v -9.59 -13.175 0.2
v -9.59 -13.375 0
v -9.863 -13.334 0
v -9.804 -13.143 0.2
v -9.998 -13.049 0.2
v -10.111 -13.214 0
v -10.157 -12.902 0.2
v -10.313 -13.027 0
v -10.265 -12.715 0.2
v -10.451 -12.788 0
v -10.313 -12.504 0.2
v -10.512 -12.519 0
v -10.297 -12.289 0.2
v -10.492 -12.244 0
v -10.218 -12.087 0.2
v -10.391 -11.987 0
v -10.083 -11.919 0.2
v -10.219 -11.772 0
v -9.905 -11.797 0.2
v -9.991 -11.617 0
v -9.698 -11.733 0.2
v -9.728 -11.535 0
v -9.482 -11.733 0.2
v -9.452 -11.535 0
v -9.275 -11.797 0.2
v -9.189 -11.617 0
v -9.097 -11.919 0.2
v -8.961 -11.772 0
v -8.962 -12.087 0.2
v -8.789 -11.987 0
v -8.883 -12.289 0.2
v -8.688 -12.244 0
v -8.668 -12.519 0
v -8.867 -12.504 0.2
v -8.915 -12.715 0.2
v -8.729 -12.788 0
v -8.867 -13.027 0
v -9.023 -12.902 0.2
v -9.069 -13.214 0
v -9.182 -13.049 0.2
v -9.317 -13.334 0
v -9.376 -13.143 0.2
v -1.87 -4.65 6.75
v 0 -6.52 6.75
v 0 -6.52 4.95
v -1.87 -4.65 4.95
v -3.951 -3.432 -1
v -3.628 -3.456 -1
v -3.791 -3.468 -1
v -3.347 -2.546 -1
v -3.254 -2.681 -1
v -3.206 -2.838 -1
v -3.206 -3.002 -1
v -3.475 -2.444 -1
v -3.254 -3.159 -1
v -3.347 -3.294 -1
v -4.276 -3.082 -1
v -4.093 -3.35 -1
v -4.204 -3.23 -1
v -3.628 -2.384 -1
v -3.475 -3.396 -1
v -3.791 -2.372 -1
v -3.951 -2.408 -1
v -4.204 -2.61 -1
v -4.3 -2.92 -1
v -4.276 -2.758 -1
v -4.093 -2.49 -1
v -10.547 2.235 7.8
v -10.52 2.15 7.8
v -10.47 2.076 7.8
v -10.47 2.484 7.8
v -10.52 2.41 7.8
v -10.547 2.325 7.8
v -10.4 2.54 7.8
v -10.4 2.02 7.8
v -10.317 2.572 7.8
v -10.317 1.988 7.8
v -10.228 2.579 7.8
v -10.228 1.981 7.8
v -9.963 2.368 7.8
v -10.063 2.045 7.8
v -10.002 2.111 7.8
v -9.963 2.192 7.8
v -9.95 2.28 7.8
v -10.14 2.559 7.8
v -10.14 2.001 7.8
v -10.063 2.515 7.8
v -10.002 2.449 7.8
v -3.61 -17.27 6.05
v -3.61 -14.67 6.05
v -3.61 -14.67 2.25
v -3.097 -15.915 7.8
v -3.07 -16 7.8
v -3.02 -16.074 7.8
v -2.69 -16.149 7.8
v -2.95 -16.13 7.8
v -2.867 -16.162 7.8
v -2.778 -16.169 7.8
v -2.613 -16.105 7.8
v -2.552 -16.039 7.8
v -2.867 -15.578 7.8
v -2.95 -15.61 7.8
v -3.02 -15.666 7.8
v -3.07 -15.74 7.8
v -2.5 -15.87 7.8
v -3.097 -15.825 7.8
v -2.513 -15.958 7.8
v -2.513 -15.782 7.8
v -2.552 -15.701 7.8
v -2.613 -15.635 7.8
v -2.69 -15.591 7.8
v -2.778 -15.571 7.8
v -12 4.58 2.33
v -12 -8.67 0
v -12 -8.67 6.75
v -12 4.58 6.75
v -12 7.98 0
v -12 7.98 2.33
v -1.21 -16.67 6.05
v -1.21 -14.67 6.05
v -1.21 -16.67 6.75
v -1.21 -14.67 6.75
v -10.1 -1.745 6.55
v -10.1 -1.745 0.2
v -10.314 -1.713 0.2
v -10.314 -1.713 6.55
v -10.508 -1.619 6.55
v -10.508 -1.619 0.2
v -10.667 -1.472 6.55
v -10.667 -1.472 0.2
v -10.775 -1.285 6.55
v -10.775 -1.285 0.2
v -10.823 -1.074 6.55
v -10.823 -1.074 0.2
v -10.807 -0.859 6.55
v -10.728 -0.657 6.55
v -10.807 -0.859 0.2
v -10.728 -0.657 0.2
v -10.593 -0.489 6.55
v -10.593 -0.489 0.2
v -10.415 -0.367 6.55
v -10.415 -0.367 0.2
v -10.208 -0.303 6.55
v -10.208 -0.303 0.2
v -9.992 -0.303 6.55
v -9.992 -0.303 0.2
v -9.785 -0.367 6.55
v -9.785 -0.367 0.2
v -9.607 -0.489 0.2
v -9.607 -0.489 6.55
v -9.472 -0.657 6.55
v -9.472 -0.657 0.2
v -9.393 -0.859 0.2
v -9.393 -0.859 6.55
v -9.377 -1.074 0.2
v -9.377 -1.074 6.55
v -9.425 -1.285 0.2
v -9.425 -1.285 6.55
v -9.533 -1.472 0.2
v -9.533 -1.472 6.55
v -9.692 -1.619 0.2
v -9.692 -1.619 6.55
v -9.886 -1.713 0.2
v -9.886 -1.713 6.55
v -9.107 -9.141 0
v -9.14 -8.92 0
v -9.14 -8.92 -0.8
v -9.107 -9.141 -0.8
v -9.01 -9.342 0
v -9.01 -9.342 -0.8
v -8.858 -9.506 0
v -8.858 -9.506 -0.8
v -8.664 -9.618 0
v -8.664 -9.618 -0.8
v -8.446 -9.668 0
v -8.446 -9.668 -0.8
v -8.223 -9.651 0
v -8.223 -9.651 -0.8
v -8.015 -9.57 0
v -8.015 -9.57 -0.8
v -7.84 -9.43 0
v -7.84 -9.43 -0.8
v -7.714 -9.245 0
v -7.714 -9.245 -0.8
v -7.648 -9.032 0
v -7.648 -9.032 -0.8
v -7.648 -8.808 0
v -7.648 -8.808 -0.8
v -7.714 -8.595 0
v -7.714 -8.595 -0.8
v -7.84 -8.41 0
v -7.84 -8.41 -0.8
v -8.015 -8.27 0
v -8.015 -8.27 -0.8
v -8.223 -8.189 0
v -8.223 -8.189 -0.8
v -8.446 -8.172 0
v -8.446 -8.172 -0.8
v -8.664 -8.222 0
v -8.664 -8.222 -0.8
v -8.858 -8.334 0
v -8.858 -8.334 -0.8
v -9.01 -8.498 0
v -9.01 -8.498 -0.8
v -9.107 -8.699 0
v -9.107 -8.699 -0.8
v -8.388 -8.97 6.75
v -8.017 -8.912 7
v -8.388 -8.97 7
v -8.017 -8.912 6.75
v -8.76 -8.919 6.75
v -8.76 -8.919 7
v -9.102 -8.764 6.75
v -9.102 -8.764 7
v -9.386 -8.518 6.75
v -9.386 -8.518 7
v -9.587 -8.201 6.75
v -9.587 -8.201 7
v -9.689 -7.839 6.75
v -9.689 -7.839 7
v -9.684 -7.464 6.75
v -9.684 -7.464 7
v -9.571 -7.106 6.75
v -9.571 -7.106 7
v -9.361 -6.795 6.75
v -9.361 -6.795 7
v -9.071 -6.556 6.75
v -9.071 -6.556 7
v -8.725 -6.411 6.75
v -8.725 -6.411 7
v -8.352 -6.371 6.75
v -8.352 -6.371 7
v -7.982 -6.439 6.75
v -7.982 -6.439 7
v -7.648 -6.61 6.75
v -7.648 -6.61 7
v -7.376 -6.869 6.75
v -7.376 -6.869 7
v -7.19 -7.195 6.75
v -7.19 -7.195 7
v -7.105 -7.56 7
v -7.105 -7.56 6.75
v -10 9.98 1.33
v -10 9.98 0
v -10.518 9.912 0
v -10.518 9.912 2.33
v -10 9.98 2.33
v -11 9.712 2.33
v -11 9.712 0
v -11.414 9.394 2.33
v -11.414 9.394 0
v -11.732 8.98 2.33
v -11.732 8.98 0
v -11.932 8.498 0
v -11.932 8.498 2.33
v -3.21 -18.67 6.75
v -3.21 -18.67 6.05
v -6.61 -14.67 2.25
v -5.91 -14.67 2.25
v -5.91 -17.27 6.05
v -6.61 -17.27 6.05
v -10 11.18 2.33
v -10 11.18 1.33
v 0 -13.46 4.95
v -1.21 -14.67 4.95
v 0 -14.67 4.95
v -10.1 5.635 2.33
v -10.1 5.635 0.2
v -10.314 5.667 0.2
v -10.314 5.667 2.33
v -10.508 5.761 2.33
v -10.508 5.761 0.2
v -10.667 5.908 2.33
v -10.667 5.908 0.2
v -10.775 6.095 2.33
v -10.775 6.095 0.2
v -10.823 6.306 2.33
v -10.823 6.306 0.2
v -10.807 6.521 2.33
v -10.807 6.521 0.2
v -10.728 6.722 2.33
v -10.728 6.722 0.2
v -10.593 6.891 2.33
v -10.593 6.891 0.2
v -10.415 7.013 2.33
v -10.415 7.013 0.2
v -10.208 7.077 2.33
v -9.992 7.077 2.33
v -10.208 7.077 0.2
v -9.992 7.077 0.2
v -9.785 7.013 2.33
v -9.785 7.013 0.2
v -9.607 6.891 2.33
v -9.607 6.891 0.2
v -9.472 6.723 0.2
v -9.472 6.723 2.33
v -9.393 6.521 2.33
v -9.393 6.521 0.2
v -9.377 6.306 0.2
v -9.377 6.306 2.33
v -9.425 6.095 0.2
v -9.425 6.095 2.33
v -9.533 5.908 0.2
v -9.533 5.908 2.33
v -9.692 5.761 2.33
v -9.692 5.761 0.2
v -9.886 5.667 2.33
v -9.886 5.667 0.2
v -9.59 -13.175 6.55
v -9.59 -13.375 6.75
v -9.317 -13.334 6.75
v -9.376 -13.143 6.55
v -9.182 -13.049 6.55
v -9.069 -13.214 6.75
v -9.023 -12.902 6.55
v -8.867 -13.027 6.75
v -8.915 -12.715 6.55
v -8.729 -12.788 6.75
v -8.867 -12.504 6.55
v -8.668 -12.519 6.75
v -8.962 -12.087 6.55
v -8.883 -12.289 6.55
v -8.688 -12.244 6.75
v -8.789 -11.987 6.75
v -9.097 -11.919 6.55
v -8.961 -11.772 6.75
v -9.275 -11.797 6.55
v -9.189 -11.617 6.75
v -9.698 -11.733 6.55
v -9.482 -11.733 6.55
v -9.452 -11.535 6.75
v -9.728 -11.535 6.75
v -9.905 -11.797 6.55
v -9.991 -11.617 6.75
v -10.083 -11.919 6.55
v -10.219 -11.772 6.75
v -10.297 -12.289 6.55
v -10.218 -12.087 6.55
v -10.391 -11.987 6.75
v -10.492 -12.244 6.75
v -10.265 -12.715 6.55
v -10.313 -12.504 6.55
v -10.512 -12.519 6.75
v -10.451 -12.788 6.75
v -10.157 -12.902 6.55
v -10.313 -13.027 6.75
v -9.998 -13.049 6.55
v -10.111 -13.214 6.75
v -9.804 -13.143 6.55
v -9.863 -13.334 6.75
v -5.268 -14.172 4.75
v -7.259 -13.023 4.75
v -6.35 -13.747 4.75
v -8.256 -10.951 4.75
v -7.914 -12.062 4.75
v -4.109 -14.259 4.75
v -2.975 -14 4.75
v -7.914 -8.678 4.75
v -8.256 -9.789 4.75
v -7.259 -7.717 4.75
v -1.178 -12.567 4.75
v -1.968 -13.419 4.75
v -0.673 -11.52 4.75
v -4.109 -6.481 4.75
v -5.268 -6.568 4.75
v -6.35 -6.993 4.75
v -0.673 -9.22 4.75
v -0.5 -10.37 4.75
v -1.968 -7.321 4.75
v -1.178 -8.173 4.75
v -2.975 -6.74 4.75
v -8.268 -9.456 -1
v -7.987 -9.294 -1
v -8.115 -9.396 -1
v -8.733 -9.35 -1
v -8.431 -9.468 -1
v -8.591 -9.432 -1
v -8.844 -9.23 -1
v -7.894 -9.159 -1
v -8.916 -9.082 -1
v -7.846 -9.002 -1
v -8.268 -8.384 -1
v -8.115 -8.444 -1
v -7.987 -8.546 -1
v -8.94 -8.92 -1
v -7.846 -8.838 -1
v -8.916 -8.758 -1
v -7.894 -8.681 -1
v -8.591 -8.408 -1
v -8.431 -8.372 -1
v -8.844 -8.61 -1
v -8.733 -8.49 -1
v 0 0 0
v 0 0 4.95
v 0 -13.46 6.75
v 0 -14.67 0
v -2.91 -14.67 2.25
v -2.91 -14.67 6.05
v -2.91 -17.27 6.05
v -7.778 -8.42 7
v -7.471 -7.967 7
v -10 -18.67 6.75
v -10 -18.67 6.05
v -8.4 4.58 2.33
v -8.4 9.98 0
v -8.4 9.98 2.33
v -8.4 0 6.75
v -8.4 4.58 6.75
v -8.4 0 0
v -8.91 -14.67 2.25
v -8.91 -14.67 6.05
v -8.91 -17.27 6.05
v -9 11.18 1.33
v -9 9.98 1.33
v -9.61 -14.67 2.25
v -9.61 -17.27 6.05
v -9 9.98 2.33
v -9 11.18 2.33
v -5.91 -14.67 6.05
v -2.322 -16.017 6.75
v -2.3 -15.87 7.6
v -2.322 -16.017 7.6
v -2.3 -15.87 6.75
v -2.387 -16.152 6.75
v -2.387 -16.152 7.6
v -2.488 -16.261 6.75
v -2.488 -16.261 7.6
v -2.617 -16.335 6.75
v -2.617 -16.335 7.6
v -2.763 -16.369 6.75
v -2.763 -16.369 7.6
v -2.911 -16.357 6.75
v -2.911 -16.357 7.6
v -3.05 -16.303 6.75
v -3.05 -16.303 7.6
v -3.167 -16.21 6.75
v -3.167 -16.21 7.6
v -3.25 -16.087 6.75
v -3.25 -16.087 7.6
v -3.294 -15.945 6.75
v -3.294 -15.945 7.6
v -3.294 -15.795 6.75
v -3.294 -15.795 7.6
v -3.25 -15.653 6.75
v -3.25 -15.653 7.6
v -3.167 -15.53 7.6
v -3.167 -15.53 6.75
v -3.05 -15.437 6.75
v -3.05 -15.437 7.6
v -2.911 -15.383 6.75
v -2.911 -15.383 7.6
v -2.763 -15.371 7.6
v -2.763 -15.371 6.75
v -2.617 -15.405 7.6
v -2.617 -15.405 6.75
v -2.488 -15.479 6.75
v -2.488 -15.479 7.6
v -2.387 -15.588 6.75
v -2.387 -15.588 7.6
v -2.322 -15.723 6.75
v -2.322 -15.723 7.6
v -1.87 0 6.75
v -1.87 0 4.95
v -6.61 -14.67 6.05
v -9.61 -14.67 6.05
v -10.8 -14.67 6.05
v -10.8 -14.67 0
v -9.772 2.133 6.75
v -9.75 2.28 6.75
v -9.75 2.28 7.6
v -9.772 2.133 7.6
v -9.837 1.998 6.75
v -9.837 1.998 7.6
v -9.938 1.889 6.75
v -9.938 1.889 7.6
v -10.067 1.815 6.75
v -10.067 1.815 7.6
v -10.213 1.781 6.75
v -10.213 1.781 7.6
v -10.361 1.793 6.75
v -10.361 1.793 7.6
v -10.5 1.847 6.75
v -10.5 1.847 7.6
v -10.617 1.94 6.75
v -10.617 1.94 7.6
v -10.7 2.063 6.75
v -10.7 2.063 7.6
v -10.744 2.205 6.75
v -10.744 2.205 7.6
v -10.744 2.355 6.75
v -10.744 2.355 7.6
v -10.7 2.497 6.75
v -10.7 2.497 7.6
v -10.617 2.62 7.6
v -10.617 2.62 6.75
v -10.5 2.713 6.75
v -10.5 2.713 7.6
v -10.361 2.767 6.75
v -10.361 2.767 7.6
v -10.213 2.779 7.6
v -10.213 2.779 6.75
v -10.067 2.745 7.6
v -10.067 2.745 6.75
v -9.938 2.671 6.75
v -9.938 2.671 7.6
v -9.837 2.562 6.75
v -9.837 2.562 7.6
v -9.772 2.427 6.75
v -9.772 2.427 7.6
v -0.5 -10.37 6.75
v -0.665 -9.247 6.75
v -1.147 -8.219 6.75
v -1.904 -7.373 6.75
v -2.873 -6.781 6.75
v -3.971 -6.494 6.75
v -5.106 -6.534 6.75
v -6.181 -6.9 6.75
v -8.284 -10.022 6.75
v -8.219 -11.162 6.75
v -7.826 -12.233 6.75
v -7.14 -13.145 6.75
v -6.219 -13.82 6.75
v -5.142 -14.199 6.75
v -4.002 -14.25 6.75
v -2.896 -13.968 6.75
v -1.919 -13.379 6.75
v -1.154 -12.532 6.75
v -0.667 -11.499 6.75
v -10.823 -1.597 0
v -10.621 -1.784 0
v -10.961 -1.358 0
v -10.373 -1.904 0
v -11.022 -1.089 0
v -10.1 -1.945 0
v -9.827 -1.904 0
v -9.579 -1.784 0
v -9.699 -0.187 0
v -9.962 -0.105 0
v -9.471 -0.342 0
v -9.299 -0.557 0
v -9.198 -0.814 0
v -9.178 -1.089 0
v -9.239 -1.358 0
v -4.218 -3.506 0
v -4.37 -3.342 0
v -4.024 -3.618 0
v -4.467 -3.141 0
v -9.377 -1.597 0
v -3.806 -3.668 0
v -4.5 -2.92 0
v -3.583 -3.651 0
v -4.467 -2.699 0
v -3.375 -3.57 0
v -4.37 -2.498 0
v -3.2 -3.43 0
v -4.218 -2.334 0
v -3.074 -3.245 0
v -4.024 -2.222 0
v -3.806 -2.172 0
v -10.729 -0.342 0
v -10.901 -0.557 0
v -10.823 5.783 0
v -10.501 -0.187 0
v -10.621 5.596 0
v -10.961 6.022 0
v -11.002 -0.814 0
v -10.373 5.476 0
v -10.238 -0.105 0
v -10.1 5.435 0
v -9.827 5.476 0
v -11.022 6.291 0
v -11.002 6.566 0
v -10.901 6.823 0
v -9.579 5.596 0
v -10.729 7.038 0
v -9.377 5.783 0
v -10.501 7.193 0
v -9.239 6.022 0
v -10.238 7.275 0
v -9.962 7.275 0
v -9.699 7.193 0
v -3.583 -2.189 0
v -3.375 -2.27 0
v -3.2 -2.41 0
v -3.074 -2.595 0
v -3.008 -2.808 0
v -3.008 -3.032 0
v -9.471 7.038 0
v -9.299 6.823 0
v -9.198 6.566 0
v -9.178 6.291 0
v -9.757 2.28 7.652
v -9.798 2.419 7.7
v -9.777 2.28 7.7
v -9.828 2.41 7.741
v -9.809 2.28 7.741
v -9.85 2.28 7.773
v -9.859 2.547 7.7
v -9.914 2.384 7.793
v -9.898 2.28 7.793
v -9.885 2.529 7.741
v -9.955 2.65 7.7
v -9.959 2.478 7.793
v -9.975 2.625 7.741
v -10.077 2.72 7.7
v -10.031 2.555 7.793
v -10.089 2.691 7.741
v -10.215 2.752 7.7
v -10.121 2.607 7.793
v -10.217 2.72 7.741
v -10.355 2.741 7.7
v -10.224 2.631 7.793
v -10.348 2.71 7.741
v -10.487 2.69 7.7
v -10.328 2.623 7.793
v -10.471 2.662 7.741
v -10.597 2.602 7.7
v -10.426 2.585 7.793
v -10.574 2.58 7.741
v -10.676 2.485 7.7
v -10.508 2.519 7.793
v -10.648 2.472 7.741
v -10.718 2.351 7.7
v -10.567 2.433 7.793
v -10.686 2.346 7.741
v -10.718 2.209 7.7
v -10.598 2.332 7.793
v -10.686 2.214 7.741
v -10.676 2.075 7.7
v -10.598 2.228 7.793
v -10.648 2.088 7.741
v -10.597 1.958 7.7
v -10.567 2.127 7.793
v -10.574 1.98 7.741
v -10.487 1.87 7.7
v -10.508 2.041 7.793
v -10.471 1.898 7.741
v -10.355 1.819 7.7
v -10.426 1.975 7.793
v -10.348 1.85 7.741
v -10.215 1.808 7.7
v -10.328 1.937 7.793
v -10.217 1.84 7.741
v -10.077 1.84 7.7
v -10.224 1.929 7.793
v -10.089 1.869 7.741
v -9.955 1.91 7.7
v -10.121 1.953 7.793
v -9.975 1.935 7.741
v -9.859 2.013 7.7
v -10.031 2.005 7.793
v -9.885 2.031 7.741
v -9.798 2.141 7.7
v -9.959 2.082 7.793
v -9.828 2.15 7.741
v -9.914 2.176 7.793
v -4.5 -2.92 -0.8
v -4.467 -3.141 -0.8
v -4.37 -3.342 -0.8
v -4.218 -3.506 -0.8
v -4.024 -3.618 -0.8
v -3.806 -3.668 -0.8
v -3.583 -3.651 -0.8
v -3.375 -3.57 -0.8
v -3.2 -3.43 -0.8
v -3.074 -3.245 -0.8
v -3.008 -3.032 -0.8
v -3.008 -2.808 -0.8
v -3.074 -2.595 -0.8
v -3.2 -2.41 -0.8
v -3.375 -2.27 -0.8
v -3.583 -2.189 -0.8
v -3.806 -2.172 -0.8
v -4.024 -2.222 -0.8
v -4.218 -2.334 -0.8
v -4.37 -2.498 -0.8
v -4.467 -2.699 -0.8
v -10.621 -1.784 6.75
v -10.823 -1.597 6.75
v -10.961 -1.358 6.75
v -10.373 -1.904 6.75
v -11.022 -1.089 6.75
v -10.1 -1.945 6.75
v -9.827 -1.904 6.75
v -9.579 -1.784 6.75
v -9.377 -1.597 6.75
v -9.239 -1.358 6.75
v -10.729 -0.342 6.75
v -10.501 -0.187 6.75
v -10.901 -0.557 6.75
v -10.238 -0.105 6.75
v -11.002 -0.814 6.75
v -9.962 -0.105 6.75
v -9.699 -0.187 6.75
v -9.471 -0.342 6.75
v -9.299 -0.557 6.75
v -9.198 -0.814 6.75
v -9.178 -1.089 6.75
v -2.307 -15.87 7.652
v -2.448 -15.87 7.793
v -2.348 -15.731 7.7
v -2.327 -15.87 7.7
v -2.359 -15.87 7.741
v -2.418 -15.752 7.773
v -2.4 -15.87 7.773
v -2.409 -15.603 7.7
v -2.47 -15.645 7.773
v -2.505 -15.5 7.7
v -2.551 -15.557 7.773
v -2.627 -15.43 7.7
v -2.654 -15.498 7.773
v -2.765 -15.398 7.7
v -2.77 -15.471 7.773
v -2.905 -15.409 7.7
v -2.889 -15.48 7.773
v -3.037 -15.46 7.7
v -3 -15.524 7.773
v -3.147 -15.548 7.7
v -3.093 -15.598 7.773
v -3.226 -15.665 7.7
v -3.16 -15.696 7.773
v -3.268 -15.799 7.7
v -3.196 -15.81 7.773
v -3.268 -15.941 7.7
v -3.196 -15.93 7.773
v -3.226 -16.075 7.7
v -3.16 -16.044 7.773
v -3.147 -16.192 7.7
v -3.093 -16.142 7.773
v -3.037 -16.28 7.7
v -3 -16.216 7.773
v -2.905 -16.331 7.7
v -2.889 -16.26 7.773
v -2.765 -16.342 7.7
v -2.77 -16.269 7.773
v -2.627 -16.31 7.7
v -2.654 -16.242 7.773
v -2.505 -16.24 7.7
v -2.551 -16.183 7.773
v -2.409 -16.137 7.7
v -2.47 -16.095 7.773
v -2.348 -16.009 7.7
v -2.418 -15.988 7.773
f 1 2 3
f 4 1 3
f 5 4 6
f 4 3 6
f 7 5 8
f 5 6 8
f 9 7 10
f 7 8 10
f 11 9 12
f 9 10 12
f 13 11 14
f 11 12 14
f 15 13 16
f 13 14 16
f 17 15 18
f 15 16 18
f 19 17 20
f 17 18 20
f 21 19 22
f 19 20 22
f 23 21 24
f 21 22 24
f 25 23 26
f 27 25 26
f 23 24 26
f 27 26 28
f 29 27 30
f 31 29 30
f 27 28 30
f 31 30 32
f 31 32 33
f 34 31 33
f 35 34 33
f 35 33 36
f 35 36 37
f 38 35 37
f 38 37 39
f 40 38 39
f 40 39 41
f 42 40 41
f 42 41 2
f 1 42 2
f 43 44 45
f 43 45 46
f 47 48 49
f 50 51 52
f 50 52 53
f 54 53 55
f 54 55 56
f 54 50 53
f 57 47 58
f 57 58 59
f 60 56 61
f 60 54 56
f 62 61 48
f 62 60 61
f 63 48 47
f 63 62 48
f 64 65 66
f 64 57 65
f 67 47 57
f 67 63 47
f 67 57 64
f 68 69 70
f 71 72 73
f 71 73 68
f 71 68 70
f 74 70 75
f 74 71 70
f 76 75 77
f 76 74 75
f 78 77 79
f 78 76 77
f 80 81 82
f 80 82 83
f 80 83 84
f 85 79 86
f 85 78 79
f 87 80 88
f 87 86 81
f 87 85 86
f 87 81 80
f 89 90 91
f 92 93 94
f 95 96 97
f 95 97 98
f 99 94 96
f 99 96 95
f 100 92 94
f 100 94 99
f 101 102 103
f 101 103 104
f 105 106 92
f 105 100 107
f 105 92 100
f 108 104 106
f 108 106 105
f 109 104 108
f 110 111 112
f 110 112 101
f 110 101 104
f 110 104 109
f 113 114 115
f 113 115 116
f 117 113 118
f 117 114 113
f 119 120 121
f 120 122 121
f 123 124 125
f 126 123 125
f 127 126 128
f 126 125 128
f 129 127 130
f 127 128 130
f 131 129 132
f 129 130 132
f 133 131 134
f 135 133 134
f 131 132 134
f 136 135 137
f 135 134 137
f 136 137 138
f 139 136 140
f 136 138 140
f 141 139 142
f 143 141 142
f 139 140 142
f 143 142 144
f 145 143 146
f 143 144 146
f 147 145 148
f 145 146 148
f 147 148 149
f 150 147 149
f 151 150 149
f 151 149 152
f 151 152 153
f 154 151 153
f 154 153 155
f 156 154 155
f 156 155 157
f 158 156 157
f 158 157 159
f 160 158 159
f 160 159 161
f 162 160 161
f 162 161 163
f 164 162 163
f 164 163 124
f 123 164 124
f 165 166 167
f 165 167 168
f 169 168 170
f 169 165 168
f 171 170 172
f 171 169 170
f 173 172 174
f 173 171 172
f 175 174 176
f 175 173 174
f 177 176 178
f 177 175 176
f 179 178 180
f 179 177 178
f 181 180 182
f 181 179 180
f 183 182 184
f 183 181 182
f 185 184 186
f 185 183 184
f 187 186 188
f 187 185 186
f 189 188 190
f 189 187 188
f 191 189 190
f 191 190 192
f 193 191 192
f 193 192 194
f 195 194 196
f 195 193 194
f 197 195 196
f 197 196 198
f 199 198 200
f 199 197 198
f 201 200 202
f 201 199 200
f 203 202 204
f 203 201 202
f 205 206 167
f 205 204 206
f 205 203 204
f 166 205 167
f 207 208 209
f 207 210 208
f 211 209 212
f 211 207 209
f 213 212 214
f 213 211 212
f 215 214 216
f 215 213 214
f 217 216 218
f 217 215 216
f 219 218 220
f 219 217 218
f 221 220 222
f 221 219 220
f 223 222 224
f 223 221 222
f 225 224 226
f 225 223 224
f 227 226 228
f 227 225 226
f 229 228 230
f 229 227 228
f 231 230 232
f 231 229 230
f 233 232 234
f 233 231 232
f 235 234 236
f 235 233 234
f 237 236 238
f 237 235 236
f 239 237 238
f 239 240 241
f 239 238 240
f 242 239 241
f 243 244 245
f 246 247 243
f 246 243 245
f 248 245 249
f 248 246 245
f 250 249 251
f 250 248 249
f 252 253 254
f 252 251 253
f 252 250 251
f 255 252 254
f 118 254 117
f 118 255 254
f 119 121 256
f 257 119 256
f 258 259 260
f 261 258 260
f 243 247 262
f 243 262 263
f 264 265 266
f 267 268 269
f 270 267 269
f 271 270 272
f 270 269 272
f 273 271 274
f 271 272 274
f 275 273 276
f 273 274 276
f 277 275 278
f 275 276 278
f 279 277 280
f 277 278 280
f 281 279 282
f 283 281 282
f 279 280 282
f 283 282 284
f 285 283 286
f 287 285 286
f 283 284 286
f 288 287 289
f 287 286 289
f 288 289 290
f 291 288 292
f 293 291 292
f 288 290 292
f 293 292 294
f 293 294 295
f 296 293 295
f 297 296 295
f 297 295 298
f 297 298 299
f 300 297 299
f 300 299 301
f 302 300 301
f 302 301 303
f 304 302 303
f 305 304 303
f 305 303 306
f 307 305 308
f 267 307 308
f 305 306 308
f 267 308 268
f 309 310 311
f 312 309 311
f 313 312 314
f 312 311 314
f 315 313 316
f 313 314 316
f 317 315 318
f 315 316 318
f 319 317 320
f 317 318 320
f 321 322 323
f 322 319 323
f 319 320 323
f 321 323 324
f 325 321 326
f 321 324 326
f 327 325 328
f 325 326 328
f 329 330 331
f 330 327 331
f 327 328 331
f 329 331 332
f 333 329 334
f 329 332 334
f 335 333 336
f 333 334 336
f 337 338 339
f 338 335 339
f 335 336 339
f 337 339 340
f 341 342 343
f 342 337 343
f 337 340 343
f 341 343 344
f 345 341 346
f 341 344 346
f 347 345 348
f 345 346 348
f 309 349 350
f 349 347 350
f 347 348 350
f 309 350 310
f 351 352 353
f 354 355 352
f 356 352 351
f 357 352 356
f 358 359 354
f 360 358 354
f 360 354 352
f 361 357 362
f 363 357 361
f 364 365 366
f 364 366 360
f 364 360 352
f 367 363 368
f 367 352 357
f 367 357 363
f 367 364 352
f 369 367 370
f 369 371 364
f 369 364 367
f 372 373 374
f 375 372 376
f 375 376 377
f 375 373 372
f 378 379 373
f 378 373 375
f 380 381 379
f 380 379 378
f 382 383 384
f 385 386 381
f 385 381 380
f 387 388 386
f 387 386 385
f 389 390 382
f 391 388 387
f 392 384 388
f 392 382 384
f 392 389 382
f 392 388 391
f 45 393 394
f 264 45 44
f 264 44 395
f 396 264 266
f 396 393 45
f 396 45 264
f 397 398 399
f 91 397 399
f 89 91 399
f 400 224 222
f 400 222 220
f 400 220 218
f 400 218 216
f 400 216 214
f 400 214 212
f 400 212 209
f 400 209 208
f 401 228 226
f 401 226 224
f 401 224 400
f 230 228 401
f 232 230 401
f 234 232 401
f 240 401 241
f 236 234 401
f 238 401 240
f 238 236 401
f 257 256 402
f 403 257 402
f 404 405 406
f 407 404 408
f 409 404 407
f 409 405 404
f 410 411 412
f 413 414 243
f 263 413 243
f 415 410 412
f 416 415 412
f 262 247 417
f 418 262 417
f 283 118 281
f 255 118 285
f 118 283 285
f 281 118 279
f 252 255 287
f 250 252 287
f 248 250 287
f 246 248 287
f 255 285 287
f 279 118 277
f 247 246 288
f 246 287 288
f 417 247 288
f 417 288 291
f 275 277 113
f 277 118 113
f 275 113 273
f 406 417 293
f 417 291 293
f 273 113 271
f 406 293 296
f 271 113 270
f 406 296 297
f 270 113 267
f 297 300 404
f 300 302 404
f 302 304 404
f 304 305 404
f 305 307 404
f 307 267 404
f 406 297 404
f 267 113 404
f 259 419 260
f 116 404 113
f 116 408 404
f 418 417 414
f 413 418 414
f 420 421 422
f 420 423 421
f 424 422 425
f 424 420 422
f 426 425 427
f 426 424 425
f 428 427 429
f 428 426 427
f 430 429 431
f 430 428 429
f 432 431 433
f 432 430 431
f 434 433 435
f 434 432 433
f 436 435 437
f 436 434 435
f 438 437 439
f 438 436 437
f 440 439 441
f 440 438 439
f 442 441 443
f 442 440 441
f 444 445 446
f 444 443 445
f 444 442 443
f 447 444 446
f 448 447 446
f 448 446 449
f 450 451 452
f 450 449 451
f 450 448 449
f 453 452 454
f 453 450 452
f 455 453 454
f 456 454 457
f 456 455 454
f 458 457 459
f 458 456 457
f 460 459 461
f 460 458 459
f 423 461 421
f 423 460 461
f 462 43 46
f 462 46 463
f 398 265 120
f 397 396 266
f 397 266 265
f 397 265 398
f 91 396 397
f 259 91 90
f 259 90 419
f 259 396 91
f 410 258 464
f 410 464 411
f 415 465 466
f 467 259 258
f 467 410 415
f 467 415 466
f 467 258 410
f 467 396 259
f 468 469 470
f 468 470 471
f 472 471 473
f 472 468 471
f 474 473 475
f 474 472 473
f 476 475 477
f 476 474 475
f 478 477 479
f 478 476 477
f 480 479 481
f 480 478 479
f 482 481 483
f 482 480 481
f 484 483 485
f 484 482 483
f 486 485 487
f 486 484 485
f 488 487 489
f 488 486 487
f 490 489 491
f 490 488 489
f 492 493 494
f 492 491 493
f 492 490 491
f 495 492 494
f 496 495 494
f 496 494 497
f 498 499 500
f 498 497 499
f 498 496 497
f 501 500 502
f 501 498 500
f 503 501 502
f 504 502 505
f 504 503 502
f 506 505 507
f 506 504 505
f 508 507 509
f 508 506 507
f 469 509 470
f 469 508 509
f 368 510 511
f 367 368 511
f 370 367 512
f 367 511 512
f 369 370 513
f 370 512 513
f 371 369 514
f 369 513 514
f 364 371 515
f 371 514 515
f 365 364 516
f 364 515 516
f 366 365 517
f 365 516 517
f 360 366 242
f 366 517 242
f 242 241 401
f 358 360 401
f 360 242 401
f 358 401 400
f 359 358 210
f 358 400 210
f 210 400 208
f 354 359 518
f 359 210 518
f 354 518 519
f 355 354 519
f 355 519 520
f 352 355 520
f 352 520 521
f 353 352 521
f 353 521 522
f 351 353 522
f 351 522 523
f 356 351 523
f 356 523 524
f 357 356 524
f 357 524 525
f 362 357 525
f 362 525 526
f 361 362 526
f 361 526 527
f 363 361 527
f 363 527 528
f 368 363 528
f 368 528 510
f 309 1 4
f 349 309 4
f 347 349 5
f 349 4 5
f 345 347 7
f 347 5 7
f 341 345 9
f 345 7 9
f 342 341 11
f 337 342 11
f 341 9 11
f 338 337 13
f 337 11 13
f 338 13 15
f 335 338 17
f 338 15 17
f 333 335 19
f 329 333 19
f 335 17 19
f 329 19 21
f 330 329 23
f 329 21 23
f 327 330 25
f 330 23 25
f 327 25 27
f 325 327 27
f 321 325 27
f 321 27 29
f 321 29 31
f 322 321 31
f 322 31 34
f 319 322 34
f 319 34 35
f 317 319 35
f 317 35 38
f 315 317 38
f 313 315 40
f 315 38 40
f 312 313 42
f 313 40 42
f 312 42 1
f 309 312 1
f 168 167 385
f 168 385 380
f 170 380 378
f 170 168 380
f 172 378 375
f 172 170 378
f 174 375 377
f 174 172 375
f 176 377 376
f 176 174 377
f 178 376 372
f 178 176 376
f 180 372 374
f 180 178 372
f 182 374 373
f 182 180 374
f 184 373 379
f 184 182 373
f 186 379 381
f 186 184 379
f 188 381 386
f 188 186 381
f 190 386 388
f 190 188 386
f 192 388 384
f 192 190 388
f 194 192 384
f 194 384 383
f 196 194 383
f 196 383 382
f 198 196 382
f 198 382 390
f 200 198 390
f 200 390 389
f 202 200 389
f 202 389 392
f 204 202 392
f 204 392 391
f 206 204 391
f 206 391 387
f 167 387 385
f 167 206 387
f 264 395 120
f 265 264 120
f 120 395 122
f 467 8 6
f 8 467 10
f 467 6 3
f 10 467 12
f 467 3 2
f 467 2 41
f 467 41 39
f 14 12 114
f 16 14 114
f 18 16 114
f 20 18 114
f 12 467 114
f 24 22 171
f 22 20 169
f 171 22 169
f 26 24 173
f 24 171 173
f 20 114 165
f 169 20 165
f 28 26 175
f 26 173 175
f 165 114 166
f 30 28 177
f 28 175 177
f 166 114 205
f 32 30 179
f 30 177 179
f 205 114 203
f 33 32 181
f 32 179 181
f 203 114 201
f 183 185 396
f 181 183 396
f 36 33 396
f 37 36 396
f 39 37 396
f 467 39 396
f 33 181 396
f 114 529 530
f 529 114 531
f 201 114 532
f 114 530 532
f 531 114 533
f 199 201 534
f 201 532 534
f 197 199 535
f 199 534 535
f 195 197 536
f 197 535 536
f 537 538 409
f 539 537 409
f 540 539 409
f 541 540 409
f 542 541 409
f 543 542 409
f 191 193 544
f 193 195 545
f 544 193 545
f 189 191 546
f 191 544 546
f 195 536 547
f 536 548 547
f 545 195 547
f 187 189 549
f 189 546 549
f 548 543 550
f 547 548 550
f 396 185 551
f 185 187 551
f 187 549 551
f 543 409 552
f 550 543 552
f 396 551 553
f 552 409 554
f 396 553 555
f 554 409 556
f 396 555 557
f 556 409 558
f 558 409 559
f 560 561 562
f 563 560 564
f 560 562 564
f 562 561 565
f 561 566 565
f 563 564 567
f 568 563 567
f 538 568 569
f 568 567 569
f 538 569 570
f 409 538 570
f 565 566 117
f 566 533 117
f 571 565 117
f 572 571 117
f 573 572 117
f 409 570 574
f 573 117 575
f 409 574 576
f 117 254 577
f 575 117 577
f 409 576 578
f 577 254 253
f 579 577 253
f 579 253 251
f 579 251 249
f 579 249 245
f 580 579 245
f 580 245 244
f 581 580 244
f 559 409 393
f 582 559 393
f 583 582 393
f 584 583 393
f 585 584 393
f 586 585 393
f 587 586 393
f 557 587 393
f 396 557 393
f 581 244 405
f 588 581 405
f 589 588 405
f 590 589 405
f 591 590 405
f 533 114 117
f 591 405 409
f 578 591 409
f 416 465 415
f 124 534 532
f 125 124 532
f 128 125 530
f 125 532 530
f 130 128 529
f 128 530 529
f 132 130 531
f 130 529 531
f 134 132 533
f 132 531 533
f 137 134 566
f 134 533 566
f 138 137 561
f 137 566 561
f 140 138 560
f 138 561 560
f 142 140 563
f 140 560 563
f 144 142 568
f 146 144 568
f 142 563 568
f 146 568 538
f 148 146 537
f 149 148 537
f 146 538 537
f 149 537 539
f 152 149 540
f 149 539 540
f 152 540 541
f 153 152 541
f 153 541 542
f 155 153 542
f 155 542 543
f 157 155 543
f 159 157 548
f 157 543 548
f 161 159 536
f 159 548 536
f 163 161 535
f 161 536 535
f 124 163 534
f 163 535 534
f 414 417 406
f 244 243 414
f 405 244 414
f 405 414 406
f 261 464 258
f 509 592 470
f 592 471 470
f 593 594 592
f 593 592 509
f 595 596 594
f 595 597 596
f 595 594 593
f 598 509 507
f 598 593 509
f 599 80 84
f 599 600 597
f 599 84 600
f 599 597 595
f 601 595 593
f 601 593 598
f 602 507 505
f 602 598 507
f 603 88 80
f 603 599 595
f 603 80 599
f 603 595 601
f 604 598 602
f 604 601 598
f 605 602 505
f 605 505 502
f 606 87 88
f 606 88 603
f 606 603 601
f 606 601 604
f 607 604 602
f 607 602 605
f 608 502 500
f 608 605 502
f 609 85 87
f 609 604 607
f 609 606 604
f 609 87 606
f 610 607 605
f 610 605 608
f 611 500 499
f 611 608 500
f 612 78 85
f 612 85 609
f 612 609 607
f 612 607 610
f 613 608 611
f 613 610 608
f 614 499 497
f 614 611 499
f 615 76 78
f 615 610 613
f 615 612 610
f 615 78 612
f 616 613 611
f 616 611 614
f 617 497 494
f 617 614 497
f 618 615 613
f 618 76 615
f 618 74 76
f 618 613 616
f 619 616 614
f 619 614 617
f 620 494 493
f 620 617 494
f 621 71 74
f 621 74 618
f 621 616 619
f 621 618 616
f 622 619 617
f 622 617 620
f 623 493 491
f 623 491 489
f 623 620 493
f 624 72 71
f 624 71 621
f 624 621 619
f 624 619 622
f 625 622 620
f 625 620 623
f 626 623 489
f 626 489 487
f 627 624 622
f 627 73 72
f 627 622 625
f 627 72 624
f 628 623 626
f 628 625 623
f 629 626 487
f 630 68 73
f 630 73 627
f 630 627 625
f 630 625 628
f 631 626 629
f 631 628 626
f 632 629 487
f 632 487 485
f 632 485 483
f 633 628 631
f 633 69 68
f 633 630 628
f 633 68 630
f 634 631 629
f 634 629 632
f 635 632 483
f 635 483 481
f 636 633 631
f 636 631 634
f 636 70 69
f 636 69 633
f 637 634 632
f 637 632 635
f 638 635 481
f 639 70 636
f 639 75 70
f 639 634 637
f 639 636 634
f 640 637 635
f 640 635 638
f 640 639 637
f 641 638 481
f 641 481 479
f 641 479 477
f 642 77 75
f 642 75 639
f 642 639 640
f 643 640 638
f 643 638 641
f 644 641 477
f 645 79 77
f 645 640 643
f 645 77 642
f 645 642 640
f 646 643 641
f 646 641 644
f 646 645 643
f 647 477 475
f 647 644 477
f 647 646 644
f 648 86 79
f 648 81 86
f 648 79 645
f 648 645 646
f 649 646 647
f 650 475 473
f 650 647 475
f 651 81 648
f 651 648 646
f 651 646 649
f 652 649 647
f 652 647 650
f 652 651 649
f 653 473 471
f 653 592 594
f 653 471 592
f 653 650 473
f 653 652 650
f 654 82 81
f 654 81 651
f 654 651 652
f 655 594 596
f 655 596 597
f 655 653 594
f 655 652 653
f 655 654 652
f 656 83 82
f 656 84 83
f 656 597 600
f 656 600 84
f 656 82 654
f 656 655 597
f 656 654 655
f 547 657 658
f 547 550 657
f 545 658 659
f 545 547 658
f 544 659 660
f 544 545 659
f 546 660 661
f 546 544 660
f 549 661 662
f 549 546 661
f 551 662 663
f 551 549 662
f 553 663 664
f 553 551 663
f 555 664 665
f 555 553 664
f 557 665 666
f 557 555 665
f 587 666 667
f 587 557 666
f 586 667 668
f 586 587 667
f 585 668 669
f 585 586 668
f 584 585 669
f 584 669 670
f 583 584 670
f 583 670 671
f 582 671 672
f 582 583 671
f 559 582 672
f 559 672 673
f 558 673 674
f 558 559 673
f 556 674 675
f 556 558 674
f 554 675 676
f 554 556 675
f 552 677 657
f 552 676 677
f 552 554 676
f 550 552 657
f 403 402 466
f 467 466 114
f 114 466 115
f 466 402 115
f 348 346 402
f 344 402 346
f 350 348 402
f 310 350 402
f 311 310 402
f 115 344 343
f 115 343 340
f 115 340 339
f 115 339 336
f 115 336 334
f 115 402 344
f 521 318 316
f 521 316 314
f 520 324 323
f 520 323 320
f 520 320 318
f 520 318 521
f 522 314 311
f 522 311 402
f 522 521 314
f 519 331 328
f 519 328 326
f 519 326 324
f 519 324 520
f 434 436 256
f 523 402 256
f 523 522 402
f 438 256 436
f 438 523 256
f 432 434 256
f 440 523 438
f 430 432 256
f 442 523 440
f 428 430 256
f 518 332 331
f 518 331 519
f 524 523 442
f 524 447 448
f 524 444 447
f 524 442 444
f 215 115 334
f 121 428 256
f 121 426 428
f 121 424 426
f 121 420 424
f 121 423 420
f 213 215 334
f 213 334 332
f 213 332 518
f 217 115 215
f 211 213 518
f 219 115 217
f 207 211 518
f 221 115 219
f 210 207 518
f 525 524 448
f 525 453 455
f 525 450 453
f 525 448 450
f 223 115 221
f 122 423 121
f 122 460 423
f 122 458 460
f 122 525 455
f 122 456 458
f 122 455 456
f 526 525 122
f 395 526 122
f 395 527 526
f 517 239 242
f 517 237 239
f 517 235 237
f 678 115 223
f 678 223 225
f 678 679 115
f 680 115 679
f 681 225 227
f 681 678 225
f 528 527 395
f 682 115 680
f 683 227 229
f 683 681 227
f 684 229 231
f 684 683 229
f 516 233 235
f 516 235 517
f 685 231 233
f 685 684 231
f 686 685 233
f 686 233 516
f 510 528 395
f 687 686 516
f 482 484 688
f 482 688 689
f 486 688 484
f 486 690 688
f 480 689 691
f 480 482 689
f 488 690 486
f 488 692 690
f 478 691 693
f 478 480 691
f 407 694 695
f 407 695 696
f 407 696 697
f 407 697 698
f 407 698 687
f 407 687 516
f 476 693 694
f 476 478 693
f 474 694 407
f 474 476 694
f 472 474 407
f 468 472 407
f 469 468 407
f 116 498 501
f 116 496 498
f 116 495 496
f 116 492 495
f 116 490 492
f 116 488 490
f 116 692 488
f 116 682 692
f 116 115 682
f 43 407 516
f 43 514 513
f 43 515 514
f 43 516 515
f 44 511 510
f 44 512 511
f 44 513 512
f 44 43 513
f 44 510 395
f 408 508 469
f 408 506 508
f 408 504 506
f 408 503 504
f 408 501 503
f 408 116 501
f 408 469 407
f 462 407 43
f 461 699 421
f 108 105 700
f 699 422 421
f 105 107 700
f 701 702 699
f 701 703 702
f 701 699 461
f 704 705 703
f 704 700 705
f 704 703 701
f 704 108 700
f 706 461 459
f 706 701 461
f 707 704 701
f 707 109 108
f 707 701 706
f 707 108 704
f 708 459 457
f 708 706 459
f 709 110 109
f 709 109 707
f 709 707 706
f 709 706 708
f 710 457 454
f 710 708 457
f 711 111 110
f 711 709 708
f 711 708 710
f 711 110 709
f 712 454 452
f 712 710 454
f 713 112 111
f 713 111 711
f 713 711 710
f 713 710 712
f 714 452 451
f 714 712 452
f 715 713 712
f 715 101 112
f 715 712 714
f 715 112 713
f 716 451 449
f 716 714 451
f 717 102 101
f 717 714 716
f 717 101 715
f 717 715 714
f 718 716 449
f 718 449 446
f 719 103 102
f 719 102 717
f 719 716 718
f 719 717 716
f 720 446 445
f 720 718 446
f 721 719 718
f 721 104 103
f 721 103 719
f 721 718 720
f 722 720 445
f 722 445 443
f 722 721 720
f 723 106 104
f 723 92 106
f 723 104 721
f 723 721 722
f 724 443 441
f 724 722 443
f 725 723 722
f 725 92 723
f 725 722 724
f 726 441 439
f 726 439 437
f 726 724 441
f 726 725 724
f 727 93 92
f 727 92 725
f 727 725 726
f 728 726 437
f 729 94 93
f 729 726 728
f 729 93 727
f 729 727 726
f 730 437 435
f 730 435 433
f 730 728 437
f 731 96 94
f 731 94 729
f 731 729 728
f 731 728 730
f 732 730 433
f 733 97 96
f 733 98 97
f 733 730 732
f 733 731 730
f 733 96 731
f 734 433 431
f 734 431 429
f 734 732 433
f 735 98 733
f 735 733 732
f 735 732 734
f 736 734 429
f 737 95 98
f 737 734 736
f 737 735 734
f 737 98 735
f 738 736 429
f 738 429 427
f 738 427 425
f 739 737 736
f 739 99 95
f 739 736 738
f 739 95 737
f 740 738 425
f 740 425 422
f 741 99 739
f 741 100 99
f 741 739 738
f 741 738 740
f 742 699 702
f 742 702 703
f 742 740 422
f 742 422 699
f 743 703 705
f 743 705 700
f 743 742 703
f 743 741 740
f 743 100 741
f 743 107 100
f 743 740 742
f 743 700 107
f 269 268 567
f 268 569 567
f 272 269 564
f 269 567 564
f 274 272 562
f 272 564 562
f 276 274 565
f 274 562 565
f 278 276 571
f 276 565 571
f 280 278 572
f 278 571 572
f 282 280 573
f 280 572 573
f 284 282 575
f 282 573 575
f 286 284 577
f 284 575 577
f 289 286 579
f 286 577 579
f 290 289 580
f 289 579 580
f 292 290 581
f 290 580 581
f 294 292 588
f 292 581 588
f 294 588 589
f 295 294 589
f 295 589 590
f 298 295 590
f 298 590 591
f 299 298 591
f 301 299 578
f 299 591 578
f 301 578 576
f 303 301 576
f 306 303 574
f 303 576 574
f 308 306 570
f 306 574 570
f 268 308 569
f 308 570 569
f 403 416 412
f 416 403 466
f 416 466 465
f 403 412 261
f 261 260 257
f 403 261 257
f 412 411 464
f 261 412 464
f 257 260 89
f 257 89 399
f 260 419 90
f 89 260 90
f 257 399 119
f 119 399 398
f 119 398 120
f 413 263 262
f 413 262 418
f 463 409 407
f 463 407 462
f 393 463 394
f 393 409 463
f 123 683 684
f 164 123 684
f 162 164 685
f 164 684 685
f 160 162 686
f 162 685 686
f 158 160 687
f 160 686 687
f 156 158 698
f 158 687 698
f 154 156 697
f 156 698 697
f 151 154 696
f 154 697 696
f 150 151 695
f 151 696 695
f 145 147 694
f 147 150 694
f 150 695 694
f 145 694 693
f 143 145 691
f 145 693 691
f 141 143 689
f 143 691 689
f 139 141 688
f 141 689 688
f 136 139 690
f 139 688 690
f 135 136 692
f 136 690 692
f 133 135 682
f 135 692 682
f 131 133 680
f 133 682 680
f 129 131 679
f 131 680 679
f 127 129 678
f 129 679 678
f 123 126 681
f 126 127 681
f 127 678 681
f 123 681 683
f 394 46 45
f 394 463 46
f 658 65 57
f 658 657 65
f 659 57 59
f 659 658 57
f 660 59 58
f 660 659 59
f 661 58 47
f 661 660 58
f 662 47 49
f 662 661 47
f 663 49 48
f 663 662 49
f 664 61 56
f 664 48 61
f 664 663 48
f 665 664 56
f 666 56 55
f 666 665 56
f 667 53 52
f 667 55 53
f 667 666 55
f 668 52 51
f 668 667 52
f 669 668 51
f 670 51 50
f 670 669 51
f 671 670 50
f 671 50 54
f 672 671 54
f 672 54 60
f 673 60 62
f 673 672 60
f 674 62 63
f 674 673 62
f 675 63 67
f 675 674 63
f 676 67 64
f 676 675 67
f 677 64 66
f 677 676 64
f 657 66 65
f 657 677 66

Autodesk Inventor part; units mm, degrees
ref_plane "YZ Plane" through (0, 0, 0) normal (1, 0, 0) x (0, 1, 0)
ref_plane "XZ Plane" through (0, 0, 0) normal (0, 1, 0) x (-1, 0, 0)
ref_plane "XY Plane" through (0, 0, 0) normal (0, 0, 1) x (1, 0, 0)
sketch "Sketch1" plane through (0, 0, 0) normal (0, 0, 1) x (1, 0, 0)
  line L0 (0, 0) -> (0, -14.67)
  line L1 (0, -14.67) -> (-10.8, -14.67)
  line L2 (-10.8, -14.67) -> (-12, -8.67)
  line L3 (-12, -8.67) -> (-12, 9.98)
  line L4 (-12, 9.98) -> (-8.4, 9.98)
  line L5 (-8.4, 9.98) -> (-8.4, 0)
  line L6 (-8.4, 0) -> (0, 0)
  dimension "d0" = 24.65
  dimension "d1" = 6
  dimension "d2" = 12
  dimension "d3" = 8.4
  dimension "d4" = 14.67
  dimension "d5" = 10.8
extrude "Extrusion1" add sketch "Sketch1" along normal blind 6.75
sketch "Sketch2" plane through (0, 0, 6.75) normal (0, 0, 1) x (1, 0, 0)
  line L0 (0, -14.67) -> (0, 0) projected
  line L1 (0, 0) -> (-8.4, 0) projected
  line L2 (-8.4, 0) -> (-8.4, 9.98) projected
  line L3 (-8.4, 9.98) -> (-12, 9.98) projected
  line L4 (-12, 9.98) -> (-12, -8.67) projected
  line L5 (-12, -8.67) -> (-10.8, -14.67) projected
  line L6 (-10.8, -14.67) -> (0, -14.67) projected
  line L7 (-12, 9.98) -> (-8.4, 9.98)
  line L8 (-8.4, 9.98) -> (-8.4, 4.58)
  line L9 (-8.4, 4.58) -> (-12, 4.58)
  line L10 (-12, 4.58) -> (-12, 9.98)
  dimension "d8" = 5.4
extrude "Extrusion2" cut sketch "Sketch2" against normal blind 4.42 contours L9 L4 L3 L2
fillet "Fillet1" radius 2 1 edges at (-12, 9.98, 1.165)
sketch "Sketch3" plane through (0, 0, 6.75) normal (0, 0, 1) x (1, 0, 0)
  line L0 (-12, 4.58) -> (-12, -8.67) projected
  line L1 (-10.8, -14.67) -> (0, -14.67) projected
  line L2 (-8.4, 4.58) -> (-12, 4.58) projected
  point P0 (0, 0)
  point P1 (-9.59, -12.45)
  point P2 (-10.1, -1.02)
  point P3 (-10.1, 6.36)
  dimension "d13" = 1.9
  dimension "d14" = 1.9
  dimension "d15" = 2.22
  dimension "d26" = 5.6
  dimension "d27" = 1.78
  dimension "d28" = 1.21
hole "Hole1" at (-9.59, -12.45, 6.75) at (-10.1, -1.02, 6.75) at (-10.1, 6.36, 6.75) direction (0, 0, -1) diameter 1.45 end through all
sketch "Sketch4" plane through (0, 0, 6.75) normal (0, 0, 1) x (1, 0, 0)
  line L0 (0, -14.67) -> (0, 0) projected
  line L1 (0, -6.52) -> (-1.87, -4.65)
  line L2 (-1.87, -4.65) -> (-1.87, 0)
  line L3 (0, 0) -> (-8.4, 0) projected
  line L4 (0, -13.46) -> (-1.21, -14.67)
  line L5 (-10.8, -14.67) -> (0, -14.67) projected
  dimension "d29" = 1.87
  dimension "d30" = 135
  dimension "d31" = 1.21
  dimension "d32" = 1.21
  dimension "d34" = 4.65
extrude "Extrusion3" cut sketch "Sketch4" against normal blind 1.8
sketch "Sketch5" plane through (0, 0, 6.75) normal (0, 0, 1) x (1, 0, 0)
  line L0 (-10.8, -14.67) -> (-1.21, -14.67) projected
  line L1 (-1.21, -14.67) -> (-1.21, -16.67)
  line L2 (-1.21, -16.67) -> (-3.21, -18.67)
  line L3 (-3.21, -18.67) -> (-10, -18.67)
  line L4 (-12, -8.67) -> (-10.8, -14.67) projected
  line L5 (-10, -18.67) -> (-10.8, -14.67)
  point P0 (0, 0)
  dimension "d37" = 4
  dimension "d38" = 135
  dimension "d39" = 2
extrude "Extrusion4" add sketch "Sketch5" against normal blind 0.7
ref_plane "Work Plane1" through (-2.91, -16.67, 6.75) normal (1, 0, 0) x (0, 0, -1)
sketch "Sketch6" plane through (-2.91, -16.67, 6.75) normal (1, 0, 0) x (0, 0, -1)
  line L0 (0.7, 2) -> (0.7, -0.6)
  line L1 (0.7, 2) -> (0.7, 0)
  line L2 (0.7, 2) -> (4.5, 2)
  line L3 (4.5, 2) -> (0.7, -0.6)
  line L4 (0.7, 2) -> (0.7, 0) projected
  line L5 (6.75, 2) -> (1.8, 2) projected
  point P0 (6.75, 16.87)
  dimension "d42" = 3.8
  dimension "d43" = 2.6
extrude "Extrusion5" add sketch "Sketch6" against normal blind 0.7
pattern_linear "Rectangular Pattern1" count 3 spacing 3 along (-1, 0, 0) of "Extrusion5"
sketch "Sketch7" plane through (0, 0, 6.75) normal (0, 0, 1) x (1, 0, 0)
  circle A0 centre (-2.8, -15.87) radius 0.5
  circle A1 centre (-10.25, 2.28) radius 0.5
  line L0 (-12, 4.58) -> (-12, -8.67) projected
  line L1 (-8.4, 4.58) -> (-12, 4.58) projected
  line L2 (-1.21, -14.67) -> (-1.21, -16.67) projected
  line L3 (0, -14.67) -> (-1.21, -14.67) projected
  line L4 (-3.21, -18.67) -> (-10, -18.67) projected
  line L5 (0, -13.46) -> (0, -6.52) projected
  point P0 (0, 0)
  dimension "d50" = 1
  dimension "d51" = 1
  dimension "d85" = 1.25
  dimension "d86" = 1.8
  dimension "d87" = 2.3
  dimension "d88" = 2.3
extrude "Extrusion6" add sketch "Sketch7" along normal blind 1.05
fillet "Fillet2" radius 0.2 2 edges at (-3.3, -15.87, 7.8) (-10.75, 2.28, 7.8)
sketch "Sketch8" plane through (0, 0, 6.75) normal (0, 0, 1) x (1, 0, 0)
  circle A0 centre (-4.4, -10.37) radius 3.9
  line L0 (0, -13.46) -> (0, -6.52) projected
  line L1 (-3.21, -18.67) -> (-10, -18.67) projected
  point P0 (0, 0)
  dimension "d59" = 7.8
  dimension "d60" = 0.5
  dimension "d61" = 4.4
extrude "Extrusion7" cut sketch "Sketch8" against normal blind 2
chamfer "Chamfer1" distance 0.2 angle 45 5 edges at (-9.59, -11.725, 0) (-10.1, -0.295, 0) (-10.1, 7.085, 0) (-9.59, -11.725, 6.75) (-10.1, -0.295, 6.75)
sketch "Sketch9" plane through (0, 0, 0) normal (0, 0, -1) x (-1, 0, 0)
  circle A0 centre (3.75, -2.92) radius 0.75
  circle A1 centre (8.39, -8.92) radius 0.75
  line L0 (0, 0) -> (0, -14.67) projected
  line L1 (0, -14.67) -> (10.8, -14.67) projected
  line L2 (12, -8.67) -> (12, 7.98) projected
  dimension "d67" = 1.5
  dimension "d68" = 1.5
  dimension "d69" = 3
  dimension "d70" = 11
  dimension "d71" = 5
  dimension "d72" = 2.86
extrude "Extrusion8" add sketch "Sketch9" along normal blind 1
chamfer "Chamfer2" distance 0.2 angle 45 2 edges at (-7.64, -8.92, -1) (-3, -2.92, -1)
sketch "Sketch10" plane through (-8.4, 9.98, 2.33) normal (0, 1, 0) x (1, 0, 0)
  line L0 (-1.6, 0) -> (-1.6, 2.33) projected
  line L1 (-1.6, 0) -> (0, 0) projected
  line L2 (0, 2.33) -> (0, 0) projected
  line L3 (-1.6, 2.33) -> (0, 2.33) projected
  line L4 (-1.6, 0) -> (-0.6, 0)
  line L5 (-0.6, 0) -> (-0.6, 1)
  line L6 (-0.6, 1) -> (-1.6, 1)
  line L7 (-1.6, 1) -> (-1.6, 0)
  point P0 (8.4, 2.33)
  dimension "d78" = 1
  dimension "d79" = 1
extrude "Extrusion9" add sketch "Sketch10" along normal blind 1.2 contours L0 L6 L5 L1
sketch "Sketch11" plane through (0, 0, 6.75) normal (0, 0, 1) x (1, 0, 0)
  arc A0 (-7.1046, -7.5602) -> (-8.0174, -8.9124) centre (-8.4, -7.67) ccw
  circle A1 centre (-4.4, -10.37) radius 3.9 projected
  line L0 (-3.21, -18.67) -> (-10, -18.67) projected
  line L1 (-12, 4.58) -> (-12, -8.67) projected
  point P0 (0, 0)
  dimension "d82" = 9.7
  dimension "d83" = 2.3
  dimension "d84" = 2.6
extrude "Extrusion10" add sketch "Sketch11" along normal blind 0.25 contours A1 A0
equation "\"d14\" = d13"
equation "\"d32\" = d31"
equation "\"d68\" = d67"
properties part number "J024 mount"
